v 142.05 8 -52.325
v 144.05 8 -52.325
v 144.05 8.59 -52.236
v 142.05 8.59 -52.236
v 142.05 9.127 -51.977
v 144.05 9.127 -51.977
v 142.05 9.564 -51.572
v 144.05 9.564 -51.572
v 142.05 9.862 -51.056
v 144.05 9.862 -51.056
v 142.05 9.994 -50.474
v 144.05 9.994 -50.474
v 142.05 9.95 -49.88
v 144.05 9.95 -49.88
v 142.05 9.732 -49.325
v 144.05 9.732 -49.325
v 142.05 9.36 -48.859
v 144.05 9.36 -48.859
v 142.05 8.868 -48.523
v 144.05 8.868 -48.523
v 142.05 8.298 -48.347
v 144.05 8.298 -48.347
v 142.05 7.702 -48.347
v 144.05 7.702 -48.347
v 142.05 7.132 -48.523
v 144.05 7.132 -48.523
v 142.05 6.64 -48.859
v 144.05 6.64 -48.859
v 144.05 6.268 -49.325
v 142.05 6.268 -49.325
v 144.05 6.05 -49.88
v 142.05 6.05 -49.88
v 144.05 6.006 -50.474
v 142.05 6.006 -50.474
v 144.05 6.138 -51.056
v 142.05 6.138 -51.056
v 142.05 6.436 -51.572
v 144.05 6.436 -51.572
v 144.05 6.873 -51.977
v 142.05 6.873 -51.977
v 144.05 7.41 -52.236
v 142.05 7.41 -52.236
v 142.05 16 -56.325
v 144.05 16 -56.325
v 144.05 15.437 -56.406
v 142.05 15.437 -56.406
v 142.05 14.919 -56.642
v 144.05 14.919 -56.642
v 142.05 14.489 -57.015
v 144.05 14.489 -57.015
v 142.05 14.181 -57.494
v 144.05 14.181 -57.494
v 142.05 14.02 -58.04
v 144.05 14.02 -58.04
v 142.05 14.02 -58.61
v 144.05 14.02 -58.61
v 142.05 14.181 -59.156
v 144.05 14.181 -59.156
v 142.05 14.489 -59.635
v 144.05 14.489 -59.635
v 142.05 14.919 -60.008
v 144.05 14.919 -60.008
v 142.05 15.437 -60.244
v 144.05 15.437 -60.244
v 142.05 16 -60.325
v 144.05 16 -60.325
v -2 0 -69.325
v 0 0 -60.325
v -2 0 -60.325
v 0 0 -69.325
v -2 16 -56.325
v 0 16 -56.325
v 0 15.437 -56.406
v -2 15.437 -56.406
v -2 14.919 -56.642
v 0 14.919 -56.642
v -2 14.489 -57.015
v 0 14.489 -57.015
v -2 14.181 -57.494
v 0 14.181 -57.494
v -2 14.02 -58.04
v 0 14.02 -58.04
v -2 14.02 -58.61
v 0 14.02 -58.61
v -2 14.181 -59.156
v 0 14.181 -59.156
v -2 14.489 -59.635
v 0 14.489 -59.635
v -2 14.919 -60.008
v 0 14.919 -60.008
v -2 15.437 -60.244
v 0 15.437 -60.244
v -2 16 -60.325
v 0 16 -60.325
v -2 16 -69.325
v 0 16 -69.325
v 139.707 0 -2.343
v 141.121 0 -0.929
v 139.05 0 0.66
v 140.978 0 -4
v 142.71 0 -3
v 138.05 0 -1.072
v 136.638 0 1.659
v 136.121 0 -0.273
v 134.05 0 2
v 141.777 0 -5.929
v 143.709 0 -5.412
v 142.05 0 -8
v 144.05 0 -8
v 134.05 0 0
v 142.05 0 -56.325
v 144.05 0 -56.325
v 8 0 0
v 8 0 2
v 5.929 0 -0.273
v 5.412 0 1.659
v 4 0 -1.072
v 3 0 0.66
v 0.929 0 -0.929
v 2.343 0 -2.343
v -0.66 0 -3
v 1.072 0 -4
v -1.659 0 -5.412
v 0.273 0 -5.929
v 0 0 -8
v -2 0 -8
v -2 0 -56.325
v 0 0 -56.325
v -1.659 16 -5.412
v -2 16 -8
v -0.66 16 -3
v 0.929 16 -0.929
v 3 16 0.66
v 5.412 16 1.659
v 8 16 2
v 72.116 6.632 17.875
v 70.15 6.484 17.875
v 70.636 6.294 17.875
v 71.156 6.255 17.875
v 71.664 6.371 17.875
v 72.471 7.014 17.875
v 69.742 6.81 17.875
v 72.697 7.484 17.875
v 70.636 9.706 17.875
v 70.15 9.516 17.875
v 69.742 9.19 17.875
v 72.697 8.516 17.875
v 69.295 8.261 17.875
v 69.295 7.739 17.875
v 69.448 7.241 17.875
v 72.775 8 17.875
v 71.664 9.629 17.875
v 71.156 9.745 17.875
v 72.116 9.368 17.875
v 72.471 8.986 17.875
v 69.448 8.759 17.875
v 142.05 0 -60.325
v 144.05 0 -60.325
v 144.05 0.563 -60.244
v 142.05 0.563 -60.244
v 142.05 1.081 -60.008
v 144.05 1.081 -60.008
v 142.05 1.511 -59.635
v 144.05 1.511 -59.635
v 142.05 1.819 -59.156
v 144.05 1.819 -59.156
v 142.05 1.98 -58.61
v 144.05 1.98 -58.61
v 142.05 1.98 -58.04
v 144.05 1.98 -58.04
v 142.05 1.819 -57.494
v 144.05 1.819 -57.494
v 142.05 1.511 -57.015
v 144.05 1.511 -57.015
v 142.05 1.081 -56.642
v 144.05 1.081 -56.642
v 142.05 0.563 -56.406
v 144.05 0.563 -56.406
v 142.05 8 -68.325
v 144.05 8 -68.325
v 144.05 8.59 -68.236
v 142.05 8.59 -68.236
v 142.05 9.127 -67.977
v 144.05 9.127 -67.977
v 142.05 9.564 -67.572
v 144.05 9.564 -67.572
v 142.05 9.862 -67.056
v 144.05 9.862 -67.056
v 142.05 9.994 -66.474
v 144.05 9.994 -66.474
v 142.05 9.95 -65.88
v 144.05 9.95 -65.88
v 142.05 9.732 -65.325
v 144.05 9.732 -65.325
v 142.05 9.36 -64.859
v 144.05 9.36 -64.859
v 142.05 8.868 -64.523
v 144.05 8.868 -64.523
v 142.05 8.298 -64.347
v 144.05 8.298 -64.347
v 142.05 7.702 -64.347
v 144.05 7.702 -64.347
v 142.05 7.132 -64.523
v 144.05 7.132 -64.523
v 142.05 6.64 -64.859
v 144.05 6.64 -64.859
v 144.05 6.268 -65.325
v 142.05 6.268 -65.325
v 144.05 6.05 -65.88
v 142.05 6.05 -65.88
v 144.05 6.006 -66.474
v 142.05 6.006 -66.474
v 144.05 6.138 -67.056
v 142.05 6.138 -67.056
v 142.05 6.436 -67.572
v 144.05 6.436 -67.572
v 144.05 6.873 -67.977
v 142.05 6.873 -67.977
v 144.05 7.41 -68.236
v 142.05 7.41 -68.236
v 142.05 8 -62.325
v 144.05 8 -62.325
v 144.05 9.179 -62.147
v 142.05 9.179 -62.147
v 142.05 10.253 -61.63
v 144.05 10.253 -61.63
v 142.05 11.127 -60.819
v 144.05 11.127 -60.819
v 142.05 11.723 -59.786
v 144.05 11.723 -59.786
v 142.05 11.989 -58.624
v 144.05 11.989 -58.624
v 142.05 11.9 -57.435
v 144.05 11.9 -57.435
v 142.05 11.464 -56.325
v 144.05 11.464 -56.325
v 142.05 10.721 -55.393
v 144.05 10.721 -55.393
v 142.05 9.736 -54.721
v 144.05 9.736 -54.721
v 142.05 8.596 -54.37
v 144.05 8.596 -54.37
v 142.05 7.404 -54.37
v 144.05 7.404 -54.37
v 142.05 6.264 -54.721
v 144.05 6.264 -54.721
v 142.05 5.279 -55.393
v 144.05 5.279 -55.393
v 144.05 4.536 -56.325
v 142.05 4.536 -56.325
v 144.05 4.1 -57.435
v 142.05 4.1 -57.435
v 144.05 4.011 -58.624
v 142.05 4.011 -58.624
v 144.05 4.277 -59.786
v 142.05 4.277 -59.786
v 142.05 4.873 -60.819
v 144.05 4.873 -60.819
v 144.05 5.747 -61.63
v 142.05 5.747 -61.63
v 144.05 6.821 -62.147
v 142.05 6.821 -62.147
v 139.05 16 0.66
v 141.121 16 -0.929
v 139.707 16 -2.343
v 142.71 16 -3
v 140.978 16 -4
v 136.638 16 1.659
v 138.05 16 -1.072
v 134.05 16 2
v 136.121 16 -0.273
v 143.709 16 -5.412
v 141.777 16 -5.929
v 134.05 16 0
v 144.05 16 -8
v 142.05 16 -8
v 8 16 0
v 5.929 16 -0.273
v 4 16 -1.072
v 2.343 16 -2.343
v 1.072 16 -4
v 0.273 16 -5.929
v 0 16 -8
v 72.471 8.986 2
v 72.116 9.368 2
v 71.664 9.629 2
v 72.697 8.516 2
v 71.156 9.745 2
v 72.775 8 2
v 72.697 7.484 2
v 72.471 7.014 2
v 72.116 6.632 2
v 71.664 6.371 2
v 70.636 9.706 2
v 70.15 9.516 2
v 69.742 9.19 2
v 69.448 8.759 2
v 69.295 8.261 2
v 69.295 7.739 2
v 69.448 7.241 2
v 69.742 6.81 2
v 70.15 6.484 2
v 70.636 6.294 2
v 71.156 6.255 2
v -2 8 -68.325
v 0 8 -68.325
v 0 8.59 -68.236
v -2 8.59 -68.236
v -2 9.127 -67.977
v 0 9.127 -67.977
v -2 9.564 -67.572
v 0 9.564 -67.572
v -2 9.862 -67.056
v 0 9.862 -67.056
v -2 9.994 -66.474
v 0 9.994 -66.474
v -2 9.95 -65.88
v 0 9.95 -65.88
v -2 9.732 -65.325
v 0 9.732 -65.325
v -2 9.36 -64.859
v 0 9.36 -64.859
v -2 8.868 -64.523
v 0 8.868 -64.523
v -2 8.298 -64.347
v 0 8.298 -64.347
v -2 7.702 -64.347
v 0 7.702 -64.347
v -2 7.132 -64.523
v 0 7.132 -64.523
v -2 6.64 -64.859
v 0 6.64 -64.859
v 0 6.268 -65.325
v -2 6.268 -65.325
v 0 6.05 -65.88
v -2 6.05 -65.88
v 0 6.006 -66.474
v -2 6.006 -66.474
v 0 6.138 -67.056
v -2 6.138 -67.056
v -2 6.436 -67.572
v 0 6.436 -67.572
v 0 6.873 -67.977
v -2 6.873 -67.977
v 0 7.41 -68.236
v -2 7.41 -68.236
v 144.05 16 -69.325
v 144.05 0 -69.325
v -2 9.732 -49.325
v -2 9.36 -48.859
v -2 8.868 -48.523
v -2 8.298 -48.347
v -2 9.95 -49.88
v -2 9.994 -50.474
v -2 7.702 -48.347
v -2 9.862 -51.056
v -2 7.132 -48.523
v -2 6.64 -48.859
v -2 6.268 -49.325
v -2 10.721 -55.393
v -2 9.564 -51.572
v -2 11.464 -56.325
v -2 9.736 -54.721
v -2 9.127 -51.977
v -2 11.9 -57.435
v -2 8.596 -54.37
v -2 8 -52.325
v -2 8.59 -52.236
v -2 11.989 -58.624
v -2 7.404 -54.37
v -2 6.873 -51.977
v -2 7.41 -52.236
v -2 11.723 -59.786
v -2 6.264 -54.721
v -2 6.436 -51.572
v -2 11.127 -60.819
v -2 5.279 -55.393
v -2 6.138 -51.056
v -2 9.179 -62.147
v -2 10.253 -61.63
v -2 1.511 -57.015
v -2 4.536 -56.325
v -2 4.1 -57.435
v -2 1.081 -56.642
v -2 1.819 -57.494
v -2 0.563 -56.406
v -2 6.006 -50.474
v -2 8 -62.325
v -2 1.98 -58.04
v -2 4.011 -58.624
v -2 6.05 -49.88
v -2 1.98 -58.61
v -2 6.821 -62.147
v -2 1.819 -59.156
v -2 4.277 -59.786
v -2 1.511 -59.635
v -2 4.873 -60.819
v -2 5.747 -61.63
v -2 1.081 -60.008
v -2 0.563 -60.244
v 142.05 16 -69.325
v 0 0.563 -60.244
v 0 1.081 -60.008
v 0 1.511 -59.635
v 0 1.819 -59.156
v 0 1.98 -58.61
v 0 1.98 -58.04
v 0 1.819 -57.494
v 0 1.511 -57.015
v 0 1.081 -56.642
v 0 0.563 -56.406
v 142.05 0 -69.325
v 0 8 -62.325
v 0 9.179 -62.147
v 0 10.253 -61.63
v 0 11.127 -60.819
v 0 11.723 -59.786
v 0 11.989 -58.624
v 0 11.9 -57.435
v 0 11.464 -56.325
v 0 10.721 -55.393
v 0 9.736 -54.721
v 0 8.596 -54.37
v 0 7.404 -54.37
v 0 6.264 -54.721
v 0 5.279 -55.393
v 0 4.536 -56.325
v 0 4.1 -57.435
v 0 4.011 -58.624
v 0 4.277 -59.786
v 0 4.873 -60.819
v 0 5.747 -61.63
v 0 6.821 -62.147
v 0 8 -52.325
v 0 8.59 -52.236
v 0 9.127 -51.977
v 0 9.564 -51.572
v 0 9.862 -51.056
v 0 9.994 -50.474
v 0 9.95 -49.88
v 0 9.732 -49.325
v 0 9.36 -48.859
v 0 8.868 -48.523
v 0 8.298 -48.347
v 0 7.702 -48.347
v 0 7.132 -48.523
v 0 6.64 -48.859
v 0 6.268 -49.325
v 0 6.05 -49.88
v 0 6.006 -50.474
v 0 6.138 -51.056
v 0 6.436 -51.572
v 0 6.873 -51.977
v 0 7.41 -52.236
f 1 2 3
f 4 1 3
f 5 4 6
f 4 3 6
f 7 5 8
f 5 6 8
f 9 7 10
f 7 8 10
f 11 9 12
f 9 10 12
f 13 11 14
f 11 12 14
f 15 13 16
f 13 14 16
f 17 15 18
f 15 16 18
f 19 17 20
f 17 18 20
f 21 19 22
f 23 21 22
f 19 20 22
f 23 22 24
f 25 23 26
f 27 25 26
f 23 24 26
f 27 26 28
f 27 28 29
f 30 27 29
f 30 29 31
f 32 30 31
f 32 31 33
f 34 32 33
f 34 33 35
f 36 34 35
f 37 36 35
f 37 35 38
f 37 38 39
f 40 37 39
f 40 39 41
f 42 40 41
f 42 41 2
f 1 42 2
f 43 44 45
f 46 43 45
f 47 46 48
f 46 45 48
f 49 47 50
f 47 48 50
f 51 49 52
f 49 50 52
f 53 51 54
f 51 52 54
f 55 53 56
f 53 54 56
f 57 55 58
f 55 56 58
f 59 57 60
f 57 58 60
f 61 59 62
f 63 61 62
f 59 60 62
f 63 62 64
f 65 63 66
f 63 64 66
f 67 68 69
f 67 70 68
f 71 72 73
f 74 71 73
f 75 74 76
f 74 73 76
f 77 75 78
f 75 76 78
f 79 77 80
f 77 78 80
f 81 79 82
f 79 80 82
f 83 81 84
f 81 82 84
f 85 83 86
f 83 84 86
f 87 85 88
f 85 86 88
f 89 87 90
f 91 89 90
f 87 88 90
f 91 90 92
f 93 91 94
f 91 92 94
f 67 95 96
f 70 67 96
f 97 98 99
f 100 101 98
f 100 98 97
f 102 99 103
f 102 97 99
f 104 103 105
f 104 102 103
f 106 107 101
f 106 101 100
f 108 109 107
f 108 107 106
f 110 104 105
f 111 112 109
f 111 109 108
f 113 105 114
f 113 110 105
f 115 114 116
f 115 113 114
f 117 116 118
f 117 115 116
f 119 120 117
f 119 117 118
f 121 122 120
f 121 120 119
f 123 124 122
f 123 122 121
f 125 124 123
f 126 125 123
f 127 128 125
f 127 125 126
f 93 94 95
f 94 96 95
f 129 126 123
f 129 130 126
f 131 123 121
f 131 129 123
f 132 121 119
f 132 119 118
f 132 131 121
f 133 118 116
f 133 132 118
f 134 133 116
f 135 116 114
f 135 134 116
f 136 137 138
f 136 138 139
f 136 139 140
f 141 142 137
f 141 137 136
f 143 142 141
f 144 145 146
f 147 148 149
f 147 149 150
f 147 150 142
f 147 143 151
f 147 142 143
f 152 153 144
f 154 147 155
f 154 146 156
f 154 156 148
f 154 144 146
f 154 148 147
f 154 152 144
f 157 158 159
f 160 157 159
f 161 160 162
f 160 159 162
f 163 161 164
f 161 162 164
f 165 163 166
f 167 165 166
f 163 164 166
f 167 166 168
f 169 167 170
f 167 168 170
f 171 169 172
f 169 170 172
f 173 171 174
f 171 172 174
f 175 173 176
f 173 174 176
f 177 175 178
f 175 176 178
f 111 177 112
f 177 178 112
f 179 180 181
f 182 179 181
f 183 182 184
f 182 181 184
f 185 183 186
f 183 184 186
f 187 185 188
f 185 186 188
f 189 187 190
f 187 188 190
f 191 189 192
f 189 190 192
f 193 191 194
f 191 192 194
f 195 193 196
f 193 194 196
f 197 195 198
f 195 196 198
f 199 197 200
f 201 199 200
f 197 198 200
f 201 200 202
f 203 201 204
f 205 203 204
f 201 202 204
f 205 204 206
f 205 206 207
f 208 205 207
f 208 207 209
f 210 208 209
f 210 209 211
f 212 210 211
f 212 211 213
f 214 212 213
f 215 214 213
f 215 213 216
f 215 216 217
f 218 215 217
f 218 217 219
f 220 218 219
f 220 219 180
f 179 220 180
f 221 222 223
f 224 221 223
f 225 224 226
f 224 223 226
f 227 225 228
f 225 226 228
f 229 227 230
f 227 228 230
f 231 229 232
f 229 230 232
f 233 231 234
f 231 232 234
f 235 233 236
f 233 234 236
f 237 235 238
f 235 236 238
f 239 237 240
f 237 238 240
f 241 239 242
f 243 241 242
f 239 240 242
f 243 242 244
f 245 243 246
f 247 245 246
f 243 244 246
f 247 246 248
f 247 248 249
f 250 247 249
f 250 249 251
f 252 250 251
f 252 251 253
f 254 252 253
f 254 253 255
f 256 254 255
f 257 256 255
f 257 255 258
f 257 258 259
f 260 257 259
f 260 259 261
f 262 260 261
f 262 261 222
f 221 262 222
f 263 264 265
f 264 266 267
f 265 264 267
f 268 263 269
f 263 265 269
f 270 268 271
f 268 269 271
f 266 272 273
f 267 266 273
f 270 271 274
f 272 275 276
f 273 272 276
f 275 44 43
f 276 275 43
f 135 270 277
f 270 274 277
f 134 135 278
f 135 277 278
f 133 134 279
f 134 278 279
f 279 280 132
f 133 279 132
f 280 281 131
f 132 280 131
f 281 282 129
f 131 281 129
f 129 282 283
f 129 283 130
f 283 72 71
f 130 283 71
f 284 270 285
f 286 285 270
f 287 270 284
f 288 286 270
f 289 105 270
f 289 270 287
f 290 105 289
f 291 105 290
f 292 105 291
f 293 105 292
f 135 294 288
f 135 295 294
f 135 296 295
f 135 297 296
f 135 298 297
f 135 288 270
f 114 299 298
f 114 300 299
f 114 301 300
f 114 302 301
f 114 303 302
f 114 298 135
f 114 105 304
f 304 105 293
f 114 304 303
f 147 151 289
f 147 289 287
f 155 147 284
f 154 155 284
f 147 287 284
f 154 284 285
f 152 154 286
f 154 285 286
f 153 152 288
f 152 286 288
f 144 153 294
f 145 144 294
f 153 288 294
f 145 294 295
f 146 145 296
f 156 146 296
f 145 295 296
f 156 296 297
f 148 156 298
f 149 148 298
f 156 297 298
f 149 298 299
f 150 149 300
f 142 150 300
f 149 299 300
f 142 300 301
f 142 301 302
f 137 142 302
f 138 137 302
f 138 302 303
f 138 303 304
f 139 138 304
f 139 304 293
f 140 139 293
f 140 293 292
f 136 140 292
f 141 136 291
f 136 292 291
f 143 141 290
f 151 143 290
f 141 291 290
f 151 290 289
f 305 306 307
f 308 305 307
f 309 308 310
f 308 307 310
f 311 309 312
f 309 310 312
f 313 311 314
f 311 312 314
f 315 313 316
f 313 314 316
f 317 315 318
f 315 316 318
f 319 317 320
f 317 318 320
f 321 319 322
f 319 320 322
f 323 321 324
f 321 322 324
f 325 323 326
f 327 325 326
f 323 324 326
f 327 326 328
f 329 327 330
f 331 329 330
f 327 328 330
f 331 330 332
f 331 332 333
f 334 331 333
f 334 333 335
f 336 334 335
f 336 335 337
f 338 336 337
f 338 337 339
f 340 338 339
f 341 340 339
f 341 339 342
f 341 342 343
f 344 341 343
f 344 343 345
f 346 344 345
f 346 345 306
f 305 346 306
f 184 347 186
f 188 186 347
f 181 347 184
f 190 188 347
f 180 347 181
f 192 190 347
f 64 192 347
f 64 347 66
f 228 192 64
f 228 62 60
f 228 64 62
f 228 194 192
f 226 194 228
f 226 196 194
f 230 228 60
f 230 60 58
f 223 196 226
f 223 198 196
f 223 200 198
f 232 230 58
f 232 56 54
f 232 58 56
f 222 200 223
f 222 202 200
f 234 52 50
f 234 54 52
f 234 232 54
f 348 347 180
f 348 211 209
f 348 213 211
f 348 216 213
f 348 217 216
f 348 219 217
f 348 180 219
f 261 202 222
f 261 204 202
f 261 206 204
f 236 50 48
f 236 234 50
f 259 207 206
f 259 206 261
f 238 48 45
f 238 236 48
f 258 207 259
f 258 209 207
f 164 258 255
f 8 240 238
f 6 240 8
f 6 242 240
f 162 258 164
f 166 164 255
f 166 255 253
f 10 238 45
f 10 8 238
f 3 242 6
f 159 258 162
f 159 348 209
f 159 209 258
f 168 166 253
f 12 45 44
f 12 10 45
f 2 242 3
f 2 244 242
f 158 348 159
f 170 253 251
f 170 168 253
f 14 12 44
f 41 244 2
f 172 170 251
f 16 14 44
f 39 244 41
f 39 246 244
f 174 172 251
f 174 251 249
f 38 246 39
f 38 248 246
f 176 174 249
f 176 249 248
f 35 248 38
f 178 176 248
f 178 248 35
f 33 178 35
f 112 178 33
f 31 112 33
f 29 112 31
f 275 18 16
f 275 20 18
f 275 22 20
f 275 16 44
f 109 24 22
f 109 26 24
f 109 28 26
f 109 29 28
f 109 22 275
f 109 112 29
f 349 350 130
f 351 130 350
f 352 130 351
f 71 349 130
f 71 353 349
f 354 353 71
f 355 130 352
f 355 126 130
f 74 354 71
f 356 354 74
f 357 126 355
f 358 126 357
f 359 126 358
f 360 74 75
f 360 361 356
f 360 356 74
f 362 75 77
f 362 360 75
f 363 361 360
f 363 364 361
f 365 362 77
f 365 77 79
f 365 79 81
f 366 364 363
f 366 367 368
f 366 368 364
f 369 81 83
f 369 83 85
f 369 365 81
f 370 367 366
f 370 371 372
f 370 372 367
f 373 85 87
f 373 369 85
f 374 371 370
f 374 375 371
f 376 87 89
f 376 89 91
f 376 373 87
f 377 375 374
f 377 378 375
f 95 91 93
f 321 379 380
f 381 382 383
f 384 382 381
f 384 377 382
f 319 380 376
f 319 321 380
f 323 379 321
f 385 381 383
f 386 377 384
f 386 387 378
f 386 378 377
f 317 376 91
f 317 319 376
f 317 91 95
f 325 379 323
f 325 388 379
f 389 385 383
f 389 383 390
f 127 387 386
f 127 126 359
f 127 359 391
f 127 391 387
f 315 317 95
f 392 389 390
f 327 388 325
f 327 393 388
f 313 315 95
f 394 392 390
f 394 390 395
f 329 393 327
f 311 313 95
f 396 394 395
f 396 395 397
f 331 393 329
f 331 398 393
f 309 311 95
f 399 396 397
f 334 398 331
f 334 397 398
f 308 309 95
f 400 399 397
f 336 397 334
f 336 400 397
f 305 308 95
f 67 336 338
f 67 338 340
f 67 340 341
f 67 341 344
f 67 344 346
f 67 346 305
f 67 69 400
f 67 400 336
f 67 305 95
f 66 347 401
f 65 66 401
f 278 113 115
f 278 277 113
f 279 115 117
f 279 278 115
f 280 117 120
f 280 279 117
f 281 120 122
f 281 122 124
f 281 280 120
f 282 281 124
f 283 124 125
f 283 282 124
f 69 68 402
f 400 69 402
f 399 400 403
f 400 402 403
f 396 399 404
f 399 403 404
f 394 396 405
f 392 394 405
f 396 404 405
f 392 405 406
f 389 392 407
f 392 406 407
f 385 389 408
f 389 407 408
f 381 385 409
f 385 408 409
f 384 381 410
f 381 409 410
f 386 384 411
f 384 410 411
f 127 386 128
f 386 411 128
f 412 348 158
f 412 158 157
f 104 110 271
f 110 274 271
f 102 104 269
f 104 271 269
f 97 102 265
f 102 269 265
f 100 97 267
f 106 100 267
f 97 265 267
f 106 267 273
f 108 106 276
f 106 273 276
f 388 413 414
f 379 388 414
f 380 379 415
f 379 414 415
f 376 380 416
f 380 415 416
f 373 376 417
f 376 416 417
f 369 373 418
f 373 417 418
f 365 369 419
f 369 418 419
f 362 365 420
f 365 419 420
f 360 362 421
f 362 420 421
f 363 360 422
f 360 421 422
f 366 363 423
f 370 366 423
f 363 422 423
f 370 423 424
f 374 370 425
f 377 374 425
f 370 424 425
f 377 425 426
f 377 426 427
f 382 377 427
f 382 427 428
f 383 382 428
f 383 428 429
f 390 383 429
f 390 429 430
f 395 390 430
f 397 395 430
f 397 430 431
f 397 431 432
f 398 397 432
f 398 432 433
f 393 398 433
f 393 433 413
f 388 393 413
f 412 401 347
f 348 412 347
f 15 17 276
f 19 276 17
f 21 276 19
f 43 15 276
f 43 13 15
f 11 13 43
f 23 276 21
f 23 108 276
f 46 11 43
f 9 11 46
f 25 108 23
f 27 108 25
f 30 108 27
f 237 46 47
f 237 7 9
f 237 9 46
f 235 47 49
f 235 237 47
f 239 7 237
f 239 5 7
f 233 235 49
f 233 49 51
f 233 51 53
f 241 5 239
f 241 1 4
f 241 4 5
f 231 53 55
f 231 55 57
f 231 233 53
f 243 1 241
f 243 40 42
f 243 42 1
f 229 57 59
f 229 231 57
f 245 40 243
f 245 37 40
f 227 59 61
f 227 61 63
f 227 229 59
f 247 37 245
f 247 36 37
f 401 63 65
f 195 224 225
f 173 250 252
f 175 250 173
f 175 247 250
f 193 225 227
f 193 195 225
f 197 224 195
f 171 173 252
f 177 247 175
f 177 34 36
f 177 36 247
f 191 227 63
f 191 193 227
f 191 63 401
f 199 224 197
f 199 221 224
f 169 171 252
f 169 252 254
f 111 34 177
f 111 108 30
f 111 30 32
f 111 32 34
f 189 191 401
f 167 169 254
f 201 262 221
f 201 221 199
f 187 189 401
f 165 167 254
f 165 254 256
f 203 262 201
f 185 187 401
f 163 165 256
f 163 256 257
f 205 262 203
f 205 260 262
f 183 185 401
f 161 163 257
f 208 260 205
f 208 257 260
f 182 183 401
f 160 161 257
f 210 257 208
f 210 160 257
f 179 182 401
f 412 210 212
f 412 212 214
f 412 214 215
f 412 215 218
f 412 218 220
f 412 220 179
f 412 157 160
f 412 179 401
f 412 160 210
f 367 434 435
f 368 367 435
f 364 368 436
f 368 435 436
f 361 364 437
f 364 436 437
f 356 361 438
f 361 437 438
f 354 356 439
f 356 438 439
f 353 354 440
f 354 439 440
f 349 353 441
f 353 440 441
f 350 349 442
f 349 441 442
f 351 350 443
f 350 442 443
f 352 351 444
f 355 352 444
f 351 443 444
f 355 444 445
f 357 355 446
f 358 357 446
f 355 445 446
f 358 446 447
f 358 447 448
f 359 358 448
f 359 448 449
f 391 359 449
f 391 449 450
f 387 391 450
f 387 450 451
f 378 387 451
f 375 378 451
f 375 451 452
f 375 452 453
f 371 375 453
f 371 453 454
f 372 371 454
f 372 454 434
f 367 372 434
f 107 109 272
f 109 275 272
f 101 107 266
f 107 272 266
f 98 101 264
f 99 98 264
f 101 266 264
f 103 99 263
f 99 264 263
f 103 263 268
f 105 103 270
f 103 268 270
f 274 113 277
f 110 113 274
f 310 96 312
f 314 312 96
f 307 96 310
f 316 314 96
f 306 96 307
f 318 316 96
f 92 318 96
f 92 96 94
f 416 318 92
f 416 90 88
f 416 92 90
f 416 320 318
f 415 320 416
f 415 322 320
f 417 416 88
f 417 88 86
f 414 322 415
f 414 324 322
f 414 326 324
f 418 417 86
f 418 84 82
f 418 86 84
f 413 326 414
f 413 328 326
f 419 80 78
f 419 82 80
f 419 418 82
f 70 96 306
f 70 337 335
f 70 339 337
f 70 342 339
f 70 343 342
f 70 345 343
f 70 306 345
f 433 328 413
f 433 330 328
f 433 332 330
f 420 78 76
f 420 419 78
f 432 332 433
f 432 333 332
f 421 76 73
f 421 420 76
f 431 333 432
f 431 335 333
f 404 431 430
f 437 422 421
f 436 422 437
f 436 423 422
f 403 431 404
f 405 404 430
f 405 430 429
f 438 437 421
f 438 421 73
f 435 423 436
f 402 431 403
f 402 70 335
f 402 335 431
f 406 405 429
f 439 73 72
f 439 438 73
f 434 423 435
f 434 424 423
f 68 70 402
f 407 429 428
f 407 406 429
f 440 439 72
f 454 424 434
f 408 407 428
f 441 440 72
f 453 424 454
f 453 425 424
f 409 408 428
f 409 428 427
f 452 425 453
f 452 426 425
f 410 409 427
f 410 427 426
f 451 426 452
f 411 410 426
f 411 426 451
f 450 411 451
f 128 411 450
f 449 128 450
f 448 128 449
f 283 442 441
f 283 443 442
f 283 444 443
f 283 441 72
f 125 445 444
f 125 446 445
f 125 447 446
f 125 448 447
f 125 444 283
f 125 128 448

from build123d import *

# Parameters (mm, degrees)
BOSS_EXTRUDE1_DEPTH = 16
FILLET1_R           = 8
FILLET2_R           = 10
SKETCH2_R           = 4
SKETCH2_R_2         = 2
CUT_EXTRUDE1_DEPTH  = 147.05
SKETCH3_R           = 1.75
BOSS_EXTRUDE2_DEPTH = 15.875


with BuildPart() as part:
    # Sketch1 → Boss-Extrude1 (new body)
    with BuildSketch(Plane(origin=(0, 0, 0), x_dir=(1, 0, 0), z_dir=(0, 1, 0))):
        Polygon((0, 0), (142.05, 0), (142.05, 69.325), (144.05, 69.325), (144.05, -2), (-2, -2), (-2, 69.325), (0, 69.325), align=None)
    extrude(amount=BOSS_EXTRUDE1_DEPTH)

    # Fillet1
    fillet1_edges = [part.edges().sort_by_distance(p)[0] for p in [
        (0, 8, 0),
        (142.05, 8, 0),
    ]]
    fillet(fillet1_edges, radius=FILLET1_R)

    # Fillet2
    fillet2_edges = [part.edges().sort_by_distance(p)[0] for p in [
        (144.05, 8, 2),
        (-2, 8, 2),
    ]]
    fillet(fillet2_edges, radius=FILLET2_R)

    # Sketch2 → Cut-Extrude1 (cut, through all)
    with BuildSketch(Plane(origin=(144.05, 0, 0), x_dir=(0, 0, -1), z_dir=(1, 0, 0))):
        with Locations((58.325, 8)):
            Circle(SKETCH2_R)
        with Locations((66.325, 8)):
            Circle(SKETCH2_R_2)
        with Locations((58.325, 0)):
            Circle(SKETCH2_R_2)
        with Locations((50.325, 8)):
            Circle(SKETCH2_R_2)
        with Locations((58.325, 16)):
            Circle(SKETCH2_R_2)
    extrude(amount=-CUT_EXTRUDE1_DEPTH, mode=Mode.SUBTRACT)

    # Sketch3 → Boss-Extrude2 (add)
    with BuildSketch(Plane.XY.offset(2)):
        with Locations((71.025, 8)):
            Circle(SKETCH3_R)
    extrude(amount=BOSS_EXTRUDE2_DEPTH)


solid = part.part
